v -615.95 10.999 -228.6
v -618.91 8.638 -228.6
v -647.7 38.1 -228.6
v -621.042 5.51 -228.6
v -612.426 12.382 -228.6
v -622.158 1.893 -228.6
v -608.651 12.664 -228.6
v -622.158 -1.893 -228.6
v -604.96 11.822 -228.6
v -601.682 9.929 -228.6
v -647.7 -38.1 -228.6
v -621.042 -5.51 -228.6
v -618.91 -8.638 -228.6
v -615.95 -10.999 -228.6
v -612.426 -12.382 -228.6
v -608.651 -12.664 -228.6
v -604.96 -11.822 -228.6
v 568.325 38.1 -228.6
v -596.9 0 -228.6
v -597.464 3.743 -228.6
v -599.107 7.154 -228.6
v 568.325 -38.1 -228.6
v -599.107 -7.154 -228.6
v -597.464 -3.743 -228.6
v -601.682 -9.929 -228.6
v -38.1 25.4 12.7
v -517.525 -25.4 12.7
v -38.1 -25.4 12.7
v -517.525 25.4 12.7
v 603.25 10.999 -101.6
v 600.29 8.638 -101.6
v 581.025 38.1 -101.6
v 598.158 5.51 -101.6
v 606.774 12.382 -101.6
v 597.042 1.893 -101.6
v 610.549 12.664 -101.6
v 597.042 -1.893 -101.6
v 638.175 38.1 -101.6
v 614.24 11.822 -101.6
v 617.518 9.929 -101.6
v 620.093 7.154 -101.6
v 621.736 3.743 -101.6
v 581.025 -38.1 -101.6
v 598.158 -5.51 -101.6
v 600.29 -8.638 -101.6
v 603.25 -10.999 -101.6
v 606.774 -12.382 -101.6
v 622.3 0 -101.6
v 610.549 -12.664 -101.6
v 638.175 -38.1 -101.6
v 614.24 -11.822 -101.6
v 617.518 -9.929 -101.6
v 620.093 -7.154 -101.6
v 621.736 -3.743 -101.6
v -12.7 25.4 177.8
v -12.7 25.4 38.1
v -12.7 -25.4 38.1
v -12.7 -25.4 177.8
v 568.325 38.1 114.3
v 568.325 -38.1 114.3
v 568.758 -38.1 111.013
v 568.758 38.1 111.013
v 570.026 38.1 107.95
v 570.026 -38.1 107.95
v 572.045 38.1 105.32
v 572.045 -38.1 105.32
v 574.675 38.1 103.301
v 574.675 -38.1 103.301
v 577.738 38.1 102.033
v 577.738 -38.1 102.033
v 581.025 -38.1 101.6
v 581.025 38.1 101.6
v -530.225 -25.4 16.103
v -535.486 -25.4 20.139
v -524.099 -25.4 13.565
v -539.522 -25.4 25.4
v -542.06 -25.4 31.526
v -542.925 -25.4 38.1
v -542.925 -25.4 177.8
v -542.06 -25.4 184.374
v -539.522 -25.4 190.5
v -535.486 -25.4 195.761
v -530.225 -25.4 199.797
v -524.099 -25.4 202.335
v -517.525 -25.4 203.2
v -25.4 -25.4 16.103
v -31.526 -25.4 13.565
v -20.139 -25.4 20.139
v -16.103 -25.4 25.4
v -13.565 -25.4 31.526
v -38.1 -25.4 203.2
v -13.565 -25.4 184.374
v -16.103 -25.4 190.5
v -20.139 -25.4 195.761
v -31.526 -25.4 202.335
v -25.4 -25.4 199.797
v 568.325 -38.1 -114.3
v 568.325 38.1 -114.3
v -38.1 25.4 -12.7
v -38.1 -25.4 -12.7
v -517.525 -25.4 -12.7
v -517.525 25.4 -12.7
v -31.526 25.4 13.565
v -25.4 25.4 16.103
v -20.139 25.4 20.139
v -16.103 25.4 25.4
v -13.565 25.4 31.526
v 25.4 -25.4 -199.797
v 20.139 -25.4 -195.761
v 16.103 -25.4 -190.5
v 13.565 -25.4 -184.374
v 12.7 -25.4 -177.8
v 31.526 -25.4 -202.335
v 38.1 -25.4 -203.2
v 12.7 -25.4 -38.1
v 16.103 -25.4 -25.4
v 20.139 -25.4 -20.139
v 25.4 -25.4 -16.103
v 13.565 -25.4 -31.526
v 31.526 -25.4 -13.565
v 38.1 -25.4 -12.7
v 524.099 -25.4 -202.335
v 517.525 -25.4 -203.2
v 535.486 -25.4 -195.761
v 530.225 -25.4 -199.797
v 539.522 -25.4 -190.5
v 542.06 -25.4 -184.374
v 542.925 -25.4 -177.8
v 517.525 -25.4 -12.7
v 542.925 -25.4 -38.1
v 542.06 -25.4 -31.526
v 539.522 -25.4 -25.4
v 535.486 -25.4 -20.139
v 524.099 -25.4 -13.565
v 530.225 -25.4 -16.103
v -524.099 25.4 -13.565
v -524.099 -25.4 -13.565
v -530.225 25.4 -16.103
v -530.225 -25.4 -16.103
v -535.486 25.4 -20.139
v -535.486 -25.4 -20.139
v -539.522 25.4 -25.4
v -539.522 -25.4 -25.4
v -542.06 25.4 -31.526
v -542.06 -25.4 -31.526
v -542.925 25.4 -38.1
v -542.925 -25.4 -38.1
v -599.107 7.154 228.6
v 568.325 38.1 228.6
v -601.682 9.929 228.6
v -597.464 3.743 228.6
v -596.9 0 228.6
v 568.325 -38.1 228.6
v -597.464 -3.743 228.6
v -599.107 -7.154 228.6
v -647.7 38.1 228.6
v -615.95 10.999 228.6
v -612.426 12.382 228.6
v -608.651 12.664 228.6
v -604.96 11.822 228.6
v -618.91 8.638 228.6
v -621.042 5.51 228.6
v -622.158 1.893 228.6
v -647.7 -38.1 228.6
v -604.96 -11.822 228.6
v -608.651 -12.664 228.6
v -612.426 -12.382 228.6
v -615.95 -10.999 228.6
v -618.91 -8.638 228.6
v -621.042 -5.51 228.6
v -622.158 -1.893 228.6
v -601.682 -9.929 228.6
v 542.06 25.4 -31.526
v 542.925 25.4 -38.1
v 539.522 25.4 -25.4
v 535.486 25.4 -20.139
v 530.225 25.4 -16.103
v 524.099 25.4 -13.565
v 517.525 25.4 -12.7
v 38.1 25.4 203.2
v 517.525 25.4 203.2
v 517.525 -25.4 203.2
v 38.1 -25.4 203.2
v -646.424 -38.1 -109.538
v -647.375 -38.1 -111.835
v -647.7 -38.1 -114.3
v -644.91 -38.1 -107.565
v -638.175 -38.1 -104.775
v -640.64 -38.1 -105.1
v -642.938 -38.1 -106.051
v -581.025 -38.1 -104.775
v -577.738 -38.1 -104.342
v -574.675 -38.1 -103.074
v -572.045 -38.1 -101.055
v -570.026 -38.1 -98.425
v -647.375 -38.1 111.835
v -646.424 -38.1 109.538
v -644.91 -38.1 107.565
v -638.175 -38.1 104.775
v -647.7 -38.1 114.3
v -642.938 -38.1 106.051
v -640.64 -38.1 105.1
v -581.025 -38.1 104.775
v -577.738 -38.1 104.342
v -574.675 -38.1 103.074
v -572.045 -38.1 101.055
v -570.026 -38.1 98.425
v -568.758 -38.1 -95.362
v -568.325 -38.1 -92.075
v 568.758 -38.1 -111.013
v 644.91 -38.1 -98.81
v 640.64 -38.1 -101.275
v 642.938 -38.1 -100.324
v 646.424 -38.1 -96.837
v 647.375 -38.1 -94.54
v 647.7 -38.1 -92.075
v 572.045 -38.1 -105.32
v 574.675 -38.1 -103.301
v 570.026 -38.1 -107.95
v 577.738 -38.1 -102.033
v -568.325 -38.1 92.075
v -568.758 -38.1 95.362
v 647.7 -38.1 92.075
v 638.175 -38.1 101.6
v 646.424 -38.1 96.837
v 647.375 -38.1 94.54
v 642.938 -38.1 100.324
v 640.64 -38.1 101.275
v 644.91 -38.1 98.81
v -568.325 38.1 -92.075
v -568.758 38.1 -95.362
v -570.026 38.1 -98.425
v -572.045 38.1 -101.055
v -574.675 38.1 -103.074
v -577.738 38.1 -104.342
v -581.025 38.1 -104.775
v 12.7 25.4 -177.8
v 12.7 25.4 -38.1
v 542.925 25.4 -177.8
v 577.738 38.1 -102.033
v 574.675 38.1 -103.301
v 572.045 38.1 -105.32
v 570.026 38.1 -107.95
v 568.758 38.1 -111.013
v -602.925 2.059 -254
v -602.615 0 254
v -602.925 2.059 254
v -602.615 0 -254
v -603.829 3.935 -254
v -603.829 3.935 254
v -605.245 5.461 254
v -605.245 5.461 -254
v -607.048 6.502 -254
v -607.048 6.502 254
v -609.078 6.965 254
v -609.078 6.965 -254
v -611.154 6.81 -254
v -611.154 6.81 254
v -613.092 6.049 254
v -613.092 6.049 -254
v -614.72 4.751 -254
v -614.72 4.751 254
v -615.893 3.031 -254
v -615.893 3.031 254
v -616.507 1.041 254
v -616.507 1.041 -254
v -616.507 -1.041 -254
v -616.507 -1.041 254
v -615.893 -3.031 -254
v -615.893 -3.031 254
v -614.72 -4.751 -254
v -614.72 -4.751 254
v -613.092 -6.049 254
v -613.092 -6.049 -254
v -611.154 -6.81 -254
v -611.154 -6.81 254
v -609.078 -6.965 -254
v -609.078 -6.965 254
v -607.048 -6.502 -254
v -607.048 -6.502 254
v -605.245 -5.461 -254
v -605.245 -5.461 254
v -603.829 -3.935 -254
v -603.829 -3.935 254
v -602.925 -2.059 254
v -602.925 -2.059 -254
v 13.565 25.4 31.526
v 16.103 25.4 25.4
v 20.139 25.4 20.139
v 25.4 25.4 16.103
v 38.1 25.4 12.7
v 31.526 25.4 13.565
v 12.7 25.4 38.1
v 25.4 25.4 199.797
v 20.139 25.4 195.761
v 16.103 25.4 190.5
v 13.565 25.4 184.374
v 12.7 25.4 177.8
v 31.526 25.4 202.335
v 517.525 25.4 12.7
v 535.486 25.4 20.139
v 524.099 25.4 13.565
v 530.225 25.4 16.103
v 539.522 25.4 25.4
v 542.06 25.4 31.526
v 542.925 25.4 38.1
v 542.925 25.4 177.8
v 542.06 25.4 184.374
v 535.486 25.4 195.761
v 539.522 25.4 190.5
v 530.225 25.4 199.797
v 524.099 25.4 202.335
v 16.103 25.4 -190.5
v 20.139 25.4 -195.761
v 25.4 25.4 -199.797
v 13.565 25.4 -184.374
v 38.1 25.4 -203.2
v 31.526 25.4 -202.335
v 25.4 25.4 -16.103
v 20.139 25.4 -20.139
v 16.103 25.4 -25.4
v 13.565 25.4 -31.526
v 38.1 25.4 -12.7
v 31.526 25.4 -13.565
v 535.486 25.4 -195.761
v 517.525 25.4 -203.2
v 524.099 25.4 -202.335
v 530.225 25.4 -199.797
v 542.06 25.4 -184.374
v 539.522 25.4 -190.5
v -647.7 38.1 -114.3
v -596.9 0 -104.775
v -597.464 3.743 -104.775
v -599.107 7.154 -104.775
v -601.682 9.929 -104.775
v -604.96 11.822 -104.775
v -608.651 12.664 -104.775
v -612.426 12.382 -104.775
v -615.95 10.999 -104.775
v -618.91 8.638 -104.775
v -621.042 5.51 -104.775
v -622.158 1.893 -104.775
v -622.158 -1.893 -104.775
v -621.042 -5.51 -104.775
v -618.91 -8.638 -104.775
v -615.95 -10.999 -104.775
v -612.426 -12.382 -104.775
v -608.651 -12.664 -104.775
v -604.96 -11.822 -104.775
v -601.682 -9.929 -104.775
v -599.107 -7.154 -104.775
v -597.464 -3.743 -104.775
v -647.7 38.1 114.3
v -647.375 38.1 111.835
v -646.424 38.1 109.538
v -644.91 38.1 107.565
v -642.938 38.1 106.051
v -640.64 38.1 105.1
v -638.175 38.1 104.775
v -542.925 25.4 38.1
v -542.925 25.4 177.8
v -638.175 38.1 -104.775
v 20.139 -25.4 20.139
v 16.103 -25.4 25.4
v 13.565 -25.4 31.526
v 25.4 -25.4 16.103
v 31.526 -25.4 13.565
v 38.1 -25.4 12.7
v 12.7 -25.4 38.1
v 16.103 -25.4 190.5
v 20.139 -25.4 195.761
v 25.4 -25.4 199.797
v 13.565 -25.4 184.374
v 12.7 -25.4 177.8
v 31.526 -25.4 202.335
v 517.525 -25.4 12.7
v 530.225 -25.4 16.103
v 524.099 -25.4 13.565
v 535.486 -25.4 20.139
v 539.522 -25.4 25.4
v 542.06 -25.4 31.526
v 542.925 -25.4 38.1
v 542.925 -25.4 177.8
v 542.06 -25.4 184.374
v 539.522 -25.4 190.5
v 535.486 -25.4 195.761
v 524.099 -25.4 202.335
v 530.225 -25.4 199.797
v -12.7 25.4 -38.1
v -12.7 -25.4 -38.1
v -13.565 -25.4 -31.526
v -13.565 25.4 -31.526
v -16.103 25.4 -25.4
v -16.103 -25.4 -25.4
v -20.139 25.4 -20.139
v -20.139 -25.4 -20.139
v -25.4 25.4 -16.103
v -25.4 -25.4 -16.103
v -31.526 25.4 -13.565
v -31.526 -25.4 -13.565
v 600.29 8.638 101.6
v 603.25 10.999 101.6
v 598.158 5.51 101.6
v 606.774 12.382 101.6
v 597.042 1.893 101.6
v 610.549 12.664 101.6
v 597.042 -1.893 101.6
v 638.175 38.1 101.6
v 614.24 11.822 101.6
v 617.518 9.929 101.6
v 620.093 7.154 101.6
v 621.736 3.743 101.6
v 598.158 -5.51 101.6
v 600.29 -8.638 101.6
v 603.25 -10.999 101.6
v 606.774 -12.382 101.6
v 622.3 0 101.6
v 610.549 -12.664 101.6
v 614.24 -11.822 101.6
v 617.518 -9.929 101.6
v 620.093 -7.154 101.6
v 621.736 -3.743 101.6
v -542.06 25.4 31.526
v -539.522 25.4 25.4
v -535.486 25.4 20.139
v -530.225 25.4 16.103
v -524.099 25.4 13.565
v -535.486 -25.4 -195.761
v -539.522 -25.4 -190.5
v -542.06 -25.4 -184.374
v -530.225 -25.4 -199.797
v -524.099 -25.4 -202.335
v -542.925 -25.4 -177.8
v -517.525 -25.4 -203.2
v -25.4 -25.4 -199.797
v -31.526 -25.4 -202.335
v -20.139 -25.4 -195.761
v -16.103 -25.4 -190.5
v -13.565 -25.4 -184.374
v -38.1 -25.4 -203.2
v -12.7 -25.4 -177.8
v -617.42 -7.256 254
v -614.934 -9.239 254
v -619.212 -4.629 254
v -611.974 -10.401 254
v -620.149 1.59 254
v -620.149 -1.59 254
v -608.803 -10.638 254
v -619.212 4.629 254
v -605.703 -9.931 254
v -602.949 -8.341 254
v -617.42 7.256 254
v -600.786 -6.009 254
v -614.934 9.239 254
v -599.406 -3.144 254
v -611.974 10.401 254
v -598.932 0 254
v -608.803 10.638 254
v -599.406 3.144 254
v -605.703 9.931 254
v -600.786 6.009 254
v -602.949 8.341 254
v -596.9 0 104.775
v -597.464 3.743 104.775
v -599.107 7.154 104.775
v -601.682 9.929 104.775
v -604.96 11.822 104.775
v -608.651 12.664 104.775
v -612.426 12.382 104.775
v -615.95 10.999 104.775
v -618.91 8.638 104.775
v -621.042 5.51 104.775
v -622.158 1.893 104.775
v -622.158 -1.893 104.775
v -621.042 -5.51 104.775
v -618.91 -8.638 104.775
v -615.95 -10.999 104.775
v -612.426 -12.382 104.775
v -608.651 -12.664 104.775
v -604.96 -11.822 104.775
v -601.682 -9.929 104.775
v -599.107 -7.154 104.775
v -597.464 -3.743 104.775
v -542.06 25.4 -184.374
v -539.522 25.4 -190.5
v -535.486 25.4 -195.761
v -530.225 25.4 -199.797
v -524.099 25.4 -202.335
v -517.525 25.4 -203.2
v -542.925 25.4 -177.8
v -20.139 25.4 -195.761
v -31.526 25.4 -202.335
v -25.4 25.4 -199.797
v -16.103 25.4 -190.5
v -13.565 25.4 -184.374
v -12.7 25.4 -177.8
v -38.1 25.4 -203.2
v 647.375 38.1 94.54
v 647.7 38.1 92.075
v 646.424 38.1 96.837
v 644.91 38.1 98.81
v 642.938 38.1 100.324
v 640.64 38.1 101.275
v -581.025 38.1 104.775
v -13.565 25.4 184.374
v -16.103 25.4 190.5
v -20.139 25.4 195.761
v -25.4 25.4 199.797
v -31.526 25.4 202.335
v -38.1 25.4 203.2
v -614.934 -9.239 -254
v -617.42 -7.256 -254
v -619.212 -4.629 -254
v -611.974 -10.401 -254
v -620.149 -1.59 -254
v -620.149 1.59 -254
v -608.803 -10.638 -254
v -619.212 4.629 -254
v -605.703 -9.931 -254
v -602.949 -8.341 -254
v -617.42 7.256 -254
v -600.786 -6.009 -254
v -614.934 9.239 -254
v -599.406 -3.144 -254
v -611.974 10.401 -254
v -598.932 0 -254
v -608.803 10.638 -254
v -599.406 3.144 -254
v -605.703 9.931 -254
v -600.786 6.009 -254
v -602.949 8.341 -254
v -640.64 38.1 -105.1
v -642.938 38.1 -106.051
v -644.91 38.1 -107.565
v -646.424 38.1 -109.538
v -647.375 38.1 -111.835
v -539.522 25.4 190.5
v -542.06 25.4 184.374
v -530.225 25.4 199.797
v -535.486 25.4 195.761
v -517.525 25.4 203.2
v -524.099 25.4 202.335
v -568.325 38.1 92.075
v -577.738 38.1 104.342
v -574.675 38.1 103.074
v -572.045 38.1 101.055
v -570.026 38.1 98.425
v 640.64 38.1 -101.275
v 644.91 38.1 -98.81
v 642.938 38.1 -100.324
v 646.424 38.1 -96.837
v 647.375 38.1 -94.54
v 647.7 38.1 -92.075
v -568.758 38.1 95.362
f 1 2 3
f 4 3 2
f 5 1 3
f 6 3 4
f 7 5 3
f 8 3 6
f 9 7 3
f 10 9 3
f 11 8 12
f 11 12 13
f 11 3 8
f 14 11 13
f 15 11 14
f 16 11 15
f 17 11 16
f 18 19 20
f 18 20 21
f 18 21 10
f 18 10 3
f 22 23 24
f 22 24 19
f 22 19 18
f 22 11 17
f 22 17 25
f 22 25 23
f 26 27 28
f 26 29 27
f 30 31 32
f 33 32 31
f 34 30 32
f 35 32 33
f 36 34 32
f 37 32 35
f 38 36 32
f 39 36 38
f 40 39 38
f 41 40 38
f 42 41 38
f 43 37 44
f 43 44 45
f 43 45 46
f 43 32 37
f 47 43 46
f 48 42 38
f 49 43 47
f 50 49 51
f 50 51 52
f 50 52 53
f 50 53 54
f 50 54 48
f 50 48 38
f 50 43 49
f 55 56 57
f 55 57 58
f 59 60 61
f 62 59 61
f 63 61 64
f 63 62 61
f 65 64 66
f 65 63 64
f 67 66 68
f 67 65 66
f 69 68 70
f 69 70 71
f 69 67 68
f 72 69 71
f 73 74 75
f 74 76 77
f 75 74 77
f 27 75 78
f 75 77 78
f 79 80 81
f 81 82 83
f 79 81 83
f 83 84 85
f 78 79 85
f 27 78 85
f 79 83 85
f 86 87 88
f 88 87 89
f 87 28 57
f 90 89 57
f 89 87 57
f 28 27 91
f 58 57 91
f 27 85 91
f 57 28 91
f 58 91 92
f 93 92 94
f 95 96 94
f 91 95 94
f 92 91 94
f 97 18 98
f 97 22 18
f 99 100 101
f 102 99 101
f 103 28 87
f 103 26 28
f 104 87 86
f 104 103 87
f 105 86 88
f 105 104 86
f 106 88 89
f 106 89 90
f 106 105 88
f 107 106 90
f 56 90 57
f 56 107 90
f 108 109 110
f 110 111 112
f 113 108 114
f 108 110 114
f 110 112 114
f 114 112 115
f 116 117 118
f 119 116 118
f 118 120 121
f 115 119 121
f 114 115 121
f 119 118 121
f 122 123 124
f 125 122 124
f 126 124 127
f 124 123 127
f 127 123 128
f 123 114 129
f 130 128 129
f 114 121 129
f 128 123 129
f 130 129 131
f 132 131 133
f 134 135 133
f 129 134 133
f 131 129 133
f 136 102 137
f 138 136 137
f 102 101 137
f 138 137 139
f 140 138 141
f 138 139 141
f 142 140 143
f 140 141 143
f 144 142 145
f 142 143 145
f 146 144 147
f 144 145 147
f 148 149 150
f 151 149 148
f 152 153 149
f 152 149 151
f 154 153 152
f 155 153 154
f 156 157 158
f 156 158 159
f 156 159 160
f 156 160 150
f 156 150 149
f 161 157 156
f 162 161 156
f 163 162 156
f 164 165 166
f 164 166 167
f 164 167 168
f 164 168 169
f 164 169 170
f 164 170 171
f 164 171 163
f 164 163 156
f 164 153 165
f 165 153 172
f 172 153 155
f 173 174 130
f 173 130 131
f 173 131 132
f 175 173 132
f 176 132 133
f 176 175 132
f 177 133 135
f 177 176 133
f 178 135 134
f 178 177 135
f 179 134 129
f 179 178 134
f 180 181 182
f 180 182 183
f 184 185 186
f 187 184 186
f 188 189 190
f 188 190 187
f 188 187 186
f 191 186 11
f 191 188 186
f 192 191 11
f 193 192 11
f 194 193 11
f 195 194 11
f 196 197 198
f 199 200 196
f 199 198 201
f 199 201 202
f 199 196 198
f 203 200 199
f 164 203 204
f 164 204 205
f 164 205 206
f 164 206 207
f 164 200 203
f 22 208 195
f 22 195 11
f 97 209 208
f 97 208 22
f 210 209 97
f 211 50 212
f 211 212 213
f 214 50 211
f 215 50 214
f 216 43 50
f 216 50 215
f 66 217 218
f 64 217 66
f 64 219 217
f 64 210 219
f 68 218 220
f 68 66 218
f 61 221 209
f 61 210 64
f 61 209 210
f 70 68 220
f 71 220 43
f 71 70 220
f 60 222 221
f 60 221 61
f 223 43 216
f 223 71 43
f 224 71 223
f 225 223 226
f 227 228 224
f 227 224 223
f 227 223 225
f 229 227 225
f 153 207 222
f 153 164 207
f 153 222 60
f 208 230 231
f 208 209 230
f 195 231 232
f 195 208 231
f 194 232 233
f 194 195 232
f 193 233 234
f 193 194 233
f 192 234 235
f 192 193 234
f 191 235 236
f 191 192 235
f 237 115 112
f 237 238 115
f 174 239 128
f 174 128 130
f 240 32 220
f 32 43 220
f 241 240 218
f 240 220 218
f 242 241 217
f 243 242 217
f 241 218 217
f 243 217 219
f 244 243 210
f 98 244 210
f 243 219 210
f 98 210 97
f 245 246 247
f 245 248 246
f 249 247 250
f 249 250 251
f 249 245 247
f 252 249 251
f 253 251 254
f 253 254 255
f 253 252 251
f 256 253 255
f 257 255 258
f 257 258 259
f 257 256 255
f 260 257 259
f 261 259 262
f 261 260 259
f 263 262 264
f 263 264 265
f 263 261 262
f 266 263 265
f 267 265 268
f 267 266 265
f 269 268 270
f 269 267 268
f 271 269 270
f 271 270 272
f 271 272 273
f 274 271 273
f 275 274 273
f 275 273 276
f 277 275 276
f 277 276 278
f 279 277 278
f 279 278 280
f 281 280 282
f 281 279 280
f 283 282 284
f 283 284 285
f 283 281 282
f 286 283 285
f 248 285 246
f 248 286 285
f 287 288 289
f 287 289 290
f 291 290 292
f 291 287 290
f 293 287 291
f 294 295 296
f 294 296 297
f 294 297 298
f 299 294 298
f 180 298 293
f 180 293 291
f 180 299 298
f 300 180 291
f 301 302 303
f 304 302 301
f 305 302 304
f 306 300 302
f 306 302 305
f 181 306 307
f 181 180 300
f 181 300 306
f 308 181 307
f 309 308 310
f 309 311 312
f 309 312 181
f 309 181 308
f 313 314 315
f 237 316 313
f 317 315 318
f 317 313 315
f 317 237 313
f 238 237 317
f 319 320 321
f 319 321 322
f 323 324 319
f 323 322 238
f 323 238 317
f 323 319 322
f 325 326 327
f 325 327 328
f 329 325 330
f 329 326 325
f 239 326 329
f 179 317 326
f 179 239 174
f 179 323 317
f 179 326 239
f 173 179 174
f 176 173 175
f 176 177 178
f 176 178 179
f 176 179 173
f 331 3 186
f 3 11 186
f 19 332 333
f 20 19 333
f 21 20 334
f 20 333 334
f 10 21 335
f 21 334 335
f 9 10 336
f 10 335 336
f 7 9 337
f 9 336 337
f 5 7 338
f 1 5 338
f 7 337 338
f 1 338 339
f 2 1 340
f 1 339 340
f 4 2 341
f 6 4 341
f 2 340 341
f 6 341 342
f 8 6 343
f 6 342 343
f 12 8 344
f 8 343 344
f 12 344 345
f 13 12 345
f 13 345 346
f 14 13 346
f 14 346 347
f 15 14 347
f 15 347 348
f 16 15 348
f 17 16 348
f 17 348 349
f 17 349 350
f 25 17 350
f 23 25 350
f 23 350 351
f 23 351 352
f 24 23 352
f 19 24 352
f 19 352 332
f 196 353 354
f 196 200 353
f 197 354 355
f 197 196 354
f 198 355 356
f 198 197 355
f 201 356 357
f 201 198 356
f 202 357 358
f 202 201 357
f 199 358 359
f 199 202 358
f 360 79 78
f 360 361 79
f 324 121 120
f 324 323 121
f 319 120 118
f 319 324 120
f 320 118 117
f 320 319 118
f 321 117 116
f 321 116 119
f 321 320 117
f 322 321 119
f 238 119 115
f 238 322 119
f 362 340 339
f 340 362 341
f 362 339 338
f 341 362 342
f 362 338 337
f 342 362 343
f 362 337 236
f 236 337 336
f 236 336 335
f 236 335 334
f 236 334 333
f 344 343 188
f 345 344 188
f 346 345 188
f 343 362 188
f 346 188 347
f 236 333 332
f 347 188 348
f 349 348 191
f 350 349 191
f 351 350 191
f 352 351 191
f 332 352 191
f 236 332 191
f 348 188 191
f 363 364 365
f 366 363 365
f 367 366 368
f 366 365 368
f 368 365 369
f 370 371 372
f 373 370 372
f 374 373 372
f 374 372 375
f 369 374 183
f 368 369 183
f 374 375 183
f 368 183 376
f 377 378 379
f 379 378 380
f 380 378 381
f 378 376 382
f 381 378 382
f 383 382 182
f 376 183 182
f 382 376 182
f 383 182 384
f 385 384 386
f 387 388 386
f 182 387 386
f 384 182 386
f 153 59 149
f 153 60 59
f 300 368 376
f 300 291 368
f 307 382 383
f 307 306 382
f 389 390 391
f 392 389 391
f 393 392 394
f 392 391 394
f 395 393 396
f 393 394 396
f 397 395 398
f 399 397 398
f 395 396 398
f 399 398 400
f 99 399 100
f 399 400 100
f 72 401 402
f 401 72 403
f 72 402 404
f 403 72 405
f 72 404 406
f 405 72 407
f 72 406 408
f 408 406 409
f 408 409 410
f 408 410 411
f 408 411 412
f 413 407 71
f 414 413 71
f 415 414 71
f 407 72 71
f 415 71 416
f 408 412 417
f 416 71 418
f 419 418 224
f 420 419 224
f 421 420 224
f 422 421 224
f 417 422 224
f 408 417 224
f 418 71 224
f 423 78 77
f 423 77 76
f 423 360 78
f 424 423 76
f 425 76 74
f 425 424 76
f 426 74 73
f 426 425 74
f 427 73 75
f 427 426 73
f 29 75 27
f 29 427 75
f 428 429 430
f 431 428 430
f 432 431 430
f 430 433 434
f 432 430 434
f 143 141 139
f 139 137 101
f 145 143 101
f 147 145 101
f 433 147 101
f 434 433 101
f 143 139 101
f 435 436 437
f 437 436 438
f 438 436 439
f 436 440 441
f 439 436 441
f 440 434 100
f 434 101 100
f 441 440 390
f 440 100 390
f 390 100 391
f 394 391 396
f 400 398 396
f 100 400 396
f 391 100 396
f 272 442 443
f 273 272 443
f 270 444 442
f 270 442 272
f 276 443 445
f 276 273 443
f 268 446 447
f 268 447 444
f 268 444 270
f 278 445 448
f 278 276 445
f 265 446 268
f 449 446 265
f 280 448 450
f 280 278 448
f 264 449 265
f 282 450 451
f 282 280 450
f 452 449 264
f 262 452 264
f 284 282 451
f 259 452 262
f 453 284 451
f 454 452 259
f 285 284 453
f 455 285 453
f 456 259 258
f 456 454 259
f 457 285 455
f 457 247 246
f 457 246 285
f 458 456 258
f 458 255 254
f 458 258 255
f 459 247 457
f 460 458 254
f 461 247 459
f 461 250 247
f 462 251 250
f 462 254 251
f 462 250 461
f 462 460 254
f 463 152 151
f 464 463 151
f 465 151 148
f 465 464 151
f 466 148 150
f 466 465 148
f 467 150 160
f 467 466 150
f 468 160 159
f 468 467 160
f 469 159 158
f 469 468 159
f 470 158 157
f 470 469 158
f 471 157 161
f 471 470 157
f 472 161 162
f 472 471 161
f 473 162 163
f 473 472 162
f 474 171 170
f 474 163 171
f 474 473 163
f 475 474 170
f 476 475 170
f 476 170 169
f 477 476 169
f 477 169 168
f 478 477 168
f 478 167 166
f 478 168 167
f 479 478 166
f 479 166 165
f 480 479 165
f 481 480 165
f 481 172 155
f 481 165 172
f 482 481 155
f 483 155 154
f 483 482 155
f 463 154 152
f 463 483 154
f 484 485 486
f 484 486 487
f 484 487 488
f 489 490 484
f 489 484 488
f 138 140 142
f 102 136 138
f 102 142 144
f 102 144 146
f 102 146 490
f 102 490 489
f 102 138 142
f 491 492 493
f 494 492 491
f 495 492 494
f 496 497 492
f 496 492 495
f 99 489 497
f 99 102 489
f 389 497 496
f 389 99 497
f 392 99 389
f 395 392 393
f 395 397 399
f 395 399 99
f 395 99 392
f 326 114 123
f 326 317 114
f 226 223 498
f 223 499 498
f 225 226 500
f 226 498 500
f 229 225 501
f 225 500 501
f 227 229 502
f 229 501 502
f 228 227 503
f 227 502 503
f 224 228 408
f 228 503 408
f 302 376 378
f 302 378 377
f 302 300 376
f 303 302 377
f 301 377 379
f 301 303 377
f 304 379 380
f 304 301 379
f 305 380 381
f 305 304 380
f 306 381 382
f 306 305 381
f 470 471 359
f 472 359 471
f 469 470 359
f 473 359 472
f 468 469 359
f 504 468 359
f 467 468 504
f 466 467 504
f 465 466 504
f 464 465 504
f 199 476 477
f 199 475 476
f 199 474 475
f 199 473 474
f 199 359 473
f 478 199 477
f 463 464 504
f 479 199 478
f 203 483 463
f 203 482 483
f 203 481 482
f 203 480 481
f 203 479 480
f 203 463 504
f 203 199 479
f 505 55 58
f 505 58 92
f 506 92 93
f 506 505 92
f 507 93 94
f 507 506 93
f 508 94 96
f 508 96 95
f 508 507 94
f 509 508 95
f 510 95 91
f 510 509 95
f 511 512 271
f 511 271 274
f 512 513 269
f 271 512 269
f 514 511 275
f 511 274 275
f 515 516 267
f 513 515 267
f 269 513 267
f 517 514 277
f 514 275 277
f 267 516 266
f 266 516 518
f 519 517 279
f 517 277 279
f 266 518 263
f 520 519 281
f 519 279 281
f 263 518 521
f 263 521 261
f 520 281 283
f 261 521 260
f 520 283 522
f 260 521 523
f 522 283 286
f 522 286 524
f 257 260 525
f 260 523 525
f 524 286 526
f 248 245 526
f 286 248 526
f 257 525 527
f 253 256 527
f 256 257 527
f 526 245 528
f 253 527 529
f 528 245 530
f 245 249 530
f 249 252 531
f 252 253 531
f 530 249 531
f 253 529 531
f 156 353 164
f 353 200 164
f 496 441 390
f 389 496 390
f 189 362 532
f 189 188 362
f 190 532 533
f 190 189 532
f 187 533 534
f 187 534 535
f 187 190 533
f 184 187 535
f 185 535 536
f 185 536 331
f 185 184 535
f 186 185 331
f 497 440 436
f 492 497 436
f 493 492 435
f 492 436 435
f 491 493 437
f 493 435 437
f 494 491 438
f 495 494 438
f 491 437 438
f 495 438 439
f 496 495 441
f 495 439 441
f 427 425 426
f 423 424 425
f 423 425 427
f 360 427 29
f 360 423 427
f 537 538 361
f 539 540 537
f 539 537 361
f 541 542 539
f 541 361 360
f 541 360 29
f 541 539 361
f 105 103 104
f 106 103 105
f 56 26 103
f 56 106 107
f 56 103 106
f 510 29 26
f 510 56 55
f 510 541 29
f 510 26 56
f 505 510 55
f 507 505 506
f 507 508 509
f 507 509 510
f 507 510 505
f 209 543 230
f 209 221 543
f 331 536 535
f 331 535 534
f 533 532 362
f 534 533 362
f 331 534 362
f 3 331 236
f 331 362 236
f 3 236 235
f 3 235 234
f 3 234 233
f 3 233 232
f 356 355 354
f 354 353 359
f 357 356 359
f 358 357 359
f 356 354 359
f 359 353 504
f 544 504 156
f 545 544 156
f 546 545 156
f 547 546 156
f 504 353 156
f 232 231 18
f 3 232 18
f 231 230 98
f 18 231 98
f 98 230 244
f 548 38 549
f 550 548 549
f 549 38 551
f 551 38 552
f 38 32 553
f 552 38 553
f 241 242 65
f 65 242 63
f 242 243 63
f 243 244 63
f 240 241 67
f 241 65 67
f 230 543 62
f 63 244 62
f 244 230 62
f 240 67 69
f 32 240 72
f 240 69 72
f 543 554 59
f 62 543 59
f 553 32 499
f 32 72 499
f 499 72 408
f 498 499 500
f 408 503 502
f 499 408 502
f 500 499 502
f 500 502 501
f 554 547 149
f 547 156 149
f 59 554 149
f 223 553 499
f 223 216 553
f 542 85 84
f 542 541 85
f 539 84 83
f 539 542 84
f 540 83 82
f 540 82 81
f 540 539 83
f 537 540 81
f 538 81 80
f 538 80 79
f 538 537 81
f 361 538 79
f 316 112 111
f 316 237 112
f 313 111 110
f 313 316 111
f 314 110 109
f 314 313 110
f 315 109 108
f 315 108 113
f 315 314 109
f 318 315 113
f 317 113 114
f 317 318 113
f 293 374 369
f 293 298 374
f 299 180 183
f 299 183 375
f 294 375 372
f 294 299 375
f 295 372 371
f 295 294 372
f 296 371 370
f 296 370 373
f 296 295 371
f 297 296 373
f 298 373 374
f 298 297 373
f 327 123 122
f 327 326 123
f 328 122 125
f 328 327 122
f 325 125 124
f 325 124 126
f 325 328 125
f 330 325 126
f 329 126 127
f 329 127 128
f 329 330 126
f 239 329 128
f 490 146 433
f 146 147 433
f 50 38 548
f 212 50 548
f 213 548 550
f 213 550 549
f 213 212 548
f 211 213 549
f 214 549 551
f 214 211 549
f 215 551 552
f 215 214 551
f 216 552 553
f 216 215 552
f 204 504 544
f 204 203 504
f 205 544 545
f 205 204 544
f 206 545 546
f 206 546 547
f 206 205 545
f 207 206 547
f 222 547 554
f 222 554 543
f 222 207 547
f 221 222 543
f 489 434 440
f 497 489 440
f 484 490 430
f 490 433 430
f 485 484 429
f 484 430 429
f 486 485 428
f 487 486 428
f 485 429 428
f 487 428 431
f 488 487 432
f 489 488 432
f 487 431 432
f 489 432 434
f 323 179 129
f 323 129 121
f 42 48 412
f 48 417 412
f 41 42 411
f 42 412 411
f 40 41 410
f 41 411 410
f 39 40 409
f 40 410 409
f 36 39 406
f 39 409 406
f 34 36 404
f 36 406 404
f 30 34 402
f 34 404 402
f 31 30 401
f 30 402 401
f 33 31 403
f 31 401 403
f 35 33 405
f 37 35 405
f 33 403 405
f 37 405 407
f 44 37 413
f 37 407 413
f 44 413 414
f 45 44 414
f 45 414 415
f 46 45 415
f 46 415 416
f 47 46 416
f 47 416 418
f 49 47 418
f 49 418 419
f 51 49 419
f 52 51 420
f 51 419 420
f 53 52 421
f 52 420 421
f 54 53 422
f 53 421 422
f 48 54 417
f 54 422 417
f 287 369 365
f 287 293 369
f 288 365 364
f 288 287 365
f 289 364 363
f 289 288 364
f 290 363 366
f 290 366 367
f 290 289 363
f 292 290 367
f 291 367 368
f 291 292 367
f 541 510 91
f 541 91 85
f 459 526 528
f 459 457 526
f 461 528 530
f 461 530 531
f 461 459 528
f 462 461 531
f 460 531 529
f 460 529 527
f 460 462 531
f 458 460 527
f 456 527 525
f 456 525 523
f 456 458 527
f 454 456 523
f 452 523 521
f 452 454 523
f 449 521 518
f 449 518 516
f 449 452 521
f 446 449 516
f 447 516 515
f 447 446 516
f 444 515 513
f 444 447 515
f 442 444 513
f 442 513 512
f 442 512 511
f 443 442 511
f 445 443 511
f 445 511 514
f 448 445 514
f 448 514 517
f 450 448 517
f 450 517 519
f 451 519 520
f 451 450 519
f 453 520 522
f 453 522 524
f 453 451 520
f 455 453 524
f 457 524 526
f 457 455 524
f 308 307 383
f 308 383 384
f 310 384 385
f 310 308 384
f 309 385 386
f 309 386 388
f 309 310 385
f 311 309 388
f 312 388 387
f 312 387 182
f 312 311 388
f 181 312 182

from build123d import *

# Parameters (mm, degrees)
F0_W     = 79.375
F0_H     = 123.825
F0_H_2   = 203.2
F1_DEPTH = 38.1
F2_R     = 12.7
F3_DEPTH = 254
F4_R     = 9.525
F5_R     = 12.7
F7_DEPTH = 25.4
F8_R     = 10.668
F8_R_2   = 6.985
F9_DEPTH = 254


with BuildPart() as f1:
    # F0 (on Front) → F1 (new body, symmetric)
    with BuildSketch(Plane.XZ):
        Polygon((568.325, 228.6), (-568.325, 228.6), (-568.325, 104.775), (-568.325, -104.775), (-568.325, -228.6), (568.325, -228.6), (568.325, -101.6), (568.325, 101.6), align=None)
        with Locations((-608.0125, 166.6875)):
            Rectangle(F0_W, F0_H)
        with Locations((608.0125, 0)):
            Rectangle(F0_W, F0_H_2)
        with Locations((-608.0125, -166.6875)):
            Rectangle(F0_W, F0_H)
    extrude(amount=F1_DEPTH, both=True)

    # F2 (on Top) → F3 (cut, symmetric)
    with BuildSketch(Plane.XY):
        with Locations((-609.6, 0)):
            Circle(F2_R)
        with Locations((609.6, 0)):
            Circle(F2_R)
    extrude(amount=F3_DEPTH, both=True, mode=Mode.SUBTRACT)

    # F4
    f4_edges = [f1.edges().sort_by_distance(p)[0] for p in [
        (647.7, 0, 101.6),
        (647.7, 0, -101.6),
        (-647.7, 0, 104.775),
        (-647.7, 0, -104.775),
    ]]
    fillet(f4_edges, radius=F4_R)

    # F5
    f5_edges = [f1.edges().sort_by_distance(p)[0] for p in [
        (-568.325, 0, 104.775),
        (-568.325, 0, -104.775),
        (568.325, 0, -101.6),
        (568.325, 0, 101.6),
    ]]
    fillet(f5_edges, radius=F5_R)

    # F6 (on Front) → F7 (cut, symmetric)
    with BuildSketch(Plane.XZ):
        with BuildLine():
            Line((-38.1, 203.2), (-517.525, 203.2))
            ThreePointArc((-517.525, 203.2), (-535.4855122421, 195.7605122421), (-542.925, 177.8))
            Line((-542.925, 177.8), (-542.925, 38.1))
            ThreePointArc((-542.925, 38.1), (-535.4855122421, 20.1394877579), (-517.525, 12.7))
            Line((-517.525, 12.7), (-38.1, 12.7))
            ThreePointArc((-38.1, 12.7), (-20.1394877579, 20.1394877579), (-12.7, 38.1))
            Line((-12.7, 38.1), (-12.7, 177.8))
            ThreePointArc((-12.7, 177.8), (-20.1394877579, 195.7605122421), (-38.1, 203.2))
        make_face()
        with BuildLine():
            ThreePointArc((38.1, 203.2), (20.1394877579, 195.7605122421), (12.7, 177.8))
            Line((12.7, 177.8), (12.7, 38.1))
            ThreePointArc((12.7, 38.1), (20.1394877579, 20.1394877579), (38.1, 12.7))
            Line((38.1, 12.7), (517.525, 12.7))
            ThreePointArc((517.525, 12.7), (535.4855122421, 20.1394877579), (542.925, 38.1))
            Line((542.925, 38.1), (542.925, 177.8))
            ThreePointArc((542.925, 177.8), (535.4855122421, 195.7605122421), (517.525, 203.2))
            Line((517.525, 203.2), (38.1, 203.2))
        make_face()
        with BuildLine():
            Line((517.525, -12.7), (38.1, -12.7))
            ThreePointArc((38.1, -12.7), (20.1394877579, -20.1394877579), (12.7, -38.1))
            Line((12.7, -38.1), (12.7, -177.8))
            ThreePointArc((12.7, -177.8), (20.1394877579, -195.7605122421), (38.1, -203.2))
            Line((38.1, -203.2), (517.525, -203.2))
            ThreePointArc((517.525, -203.2), (535.4855122421, -195.7605122421), (542.925, -177.8))
            Line((542.925, -177.8), (542.925, -38.1))
            ThreePointArc((542.925, -38.1), (535.4855122421, -20.1394877579), (517.525, -12.7))
        make_face()
        with BuildLine():
            ThreePointArc((-542.925, -177.8), (-535.4855122421, -195.7605122421), (-517.525, -203.2))
            Line((-517.525, -203.2), (-38.1, -203.2))
            ThreePointArc((-38.1, -203.2), (-20.1394877579, -195.7605122421), (-12.7, -177.8))
            Line((-12.7, -177.8), (-12.7, -38.1))
            ThreePointArc((-12.7, -38.1), (-20.1394877579, -20.1394877579), (-38.1, -12.7))
            Line((-38.1, -12.7), (-517.525, -12.7))
            ThreePointArc((-517.525, -12.7), (-535.4855122421, -20.1394877579), (-542.925, -38.1))
            Line((-542.925, -38.1), (-542.925, -177.8))
        make_face()
    extrude(amount=F7_DEPTH, both=True, mode=Mode.SUBTRACT)


with BuildPart() as f9:
    # F8 (on Top) → F9 (new body, symmetric)
    with BuildSketch(Plane.XY):
        with Locations((-609.6, 0)):
            Circle(F8_R)
        with Locations((-609.6, 0)):
            Circle(F8_R_2, mode=Mode.SUBTRACT)
    extrude(amount=F9_DEPTH, both=True)


solid = Compound([f1.part, f9.part])
